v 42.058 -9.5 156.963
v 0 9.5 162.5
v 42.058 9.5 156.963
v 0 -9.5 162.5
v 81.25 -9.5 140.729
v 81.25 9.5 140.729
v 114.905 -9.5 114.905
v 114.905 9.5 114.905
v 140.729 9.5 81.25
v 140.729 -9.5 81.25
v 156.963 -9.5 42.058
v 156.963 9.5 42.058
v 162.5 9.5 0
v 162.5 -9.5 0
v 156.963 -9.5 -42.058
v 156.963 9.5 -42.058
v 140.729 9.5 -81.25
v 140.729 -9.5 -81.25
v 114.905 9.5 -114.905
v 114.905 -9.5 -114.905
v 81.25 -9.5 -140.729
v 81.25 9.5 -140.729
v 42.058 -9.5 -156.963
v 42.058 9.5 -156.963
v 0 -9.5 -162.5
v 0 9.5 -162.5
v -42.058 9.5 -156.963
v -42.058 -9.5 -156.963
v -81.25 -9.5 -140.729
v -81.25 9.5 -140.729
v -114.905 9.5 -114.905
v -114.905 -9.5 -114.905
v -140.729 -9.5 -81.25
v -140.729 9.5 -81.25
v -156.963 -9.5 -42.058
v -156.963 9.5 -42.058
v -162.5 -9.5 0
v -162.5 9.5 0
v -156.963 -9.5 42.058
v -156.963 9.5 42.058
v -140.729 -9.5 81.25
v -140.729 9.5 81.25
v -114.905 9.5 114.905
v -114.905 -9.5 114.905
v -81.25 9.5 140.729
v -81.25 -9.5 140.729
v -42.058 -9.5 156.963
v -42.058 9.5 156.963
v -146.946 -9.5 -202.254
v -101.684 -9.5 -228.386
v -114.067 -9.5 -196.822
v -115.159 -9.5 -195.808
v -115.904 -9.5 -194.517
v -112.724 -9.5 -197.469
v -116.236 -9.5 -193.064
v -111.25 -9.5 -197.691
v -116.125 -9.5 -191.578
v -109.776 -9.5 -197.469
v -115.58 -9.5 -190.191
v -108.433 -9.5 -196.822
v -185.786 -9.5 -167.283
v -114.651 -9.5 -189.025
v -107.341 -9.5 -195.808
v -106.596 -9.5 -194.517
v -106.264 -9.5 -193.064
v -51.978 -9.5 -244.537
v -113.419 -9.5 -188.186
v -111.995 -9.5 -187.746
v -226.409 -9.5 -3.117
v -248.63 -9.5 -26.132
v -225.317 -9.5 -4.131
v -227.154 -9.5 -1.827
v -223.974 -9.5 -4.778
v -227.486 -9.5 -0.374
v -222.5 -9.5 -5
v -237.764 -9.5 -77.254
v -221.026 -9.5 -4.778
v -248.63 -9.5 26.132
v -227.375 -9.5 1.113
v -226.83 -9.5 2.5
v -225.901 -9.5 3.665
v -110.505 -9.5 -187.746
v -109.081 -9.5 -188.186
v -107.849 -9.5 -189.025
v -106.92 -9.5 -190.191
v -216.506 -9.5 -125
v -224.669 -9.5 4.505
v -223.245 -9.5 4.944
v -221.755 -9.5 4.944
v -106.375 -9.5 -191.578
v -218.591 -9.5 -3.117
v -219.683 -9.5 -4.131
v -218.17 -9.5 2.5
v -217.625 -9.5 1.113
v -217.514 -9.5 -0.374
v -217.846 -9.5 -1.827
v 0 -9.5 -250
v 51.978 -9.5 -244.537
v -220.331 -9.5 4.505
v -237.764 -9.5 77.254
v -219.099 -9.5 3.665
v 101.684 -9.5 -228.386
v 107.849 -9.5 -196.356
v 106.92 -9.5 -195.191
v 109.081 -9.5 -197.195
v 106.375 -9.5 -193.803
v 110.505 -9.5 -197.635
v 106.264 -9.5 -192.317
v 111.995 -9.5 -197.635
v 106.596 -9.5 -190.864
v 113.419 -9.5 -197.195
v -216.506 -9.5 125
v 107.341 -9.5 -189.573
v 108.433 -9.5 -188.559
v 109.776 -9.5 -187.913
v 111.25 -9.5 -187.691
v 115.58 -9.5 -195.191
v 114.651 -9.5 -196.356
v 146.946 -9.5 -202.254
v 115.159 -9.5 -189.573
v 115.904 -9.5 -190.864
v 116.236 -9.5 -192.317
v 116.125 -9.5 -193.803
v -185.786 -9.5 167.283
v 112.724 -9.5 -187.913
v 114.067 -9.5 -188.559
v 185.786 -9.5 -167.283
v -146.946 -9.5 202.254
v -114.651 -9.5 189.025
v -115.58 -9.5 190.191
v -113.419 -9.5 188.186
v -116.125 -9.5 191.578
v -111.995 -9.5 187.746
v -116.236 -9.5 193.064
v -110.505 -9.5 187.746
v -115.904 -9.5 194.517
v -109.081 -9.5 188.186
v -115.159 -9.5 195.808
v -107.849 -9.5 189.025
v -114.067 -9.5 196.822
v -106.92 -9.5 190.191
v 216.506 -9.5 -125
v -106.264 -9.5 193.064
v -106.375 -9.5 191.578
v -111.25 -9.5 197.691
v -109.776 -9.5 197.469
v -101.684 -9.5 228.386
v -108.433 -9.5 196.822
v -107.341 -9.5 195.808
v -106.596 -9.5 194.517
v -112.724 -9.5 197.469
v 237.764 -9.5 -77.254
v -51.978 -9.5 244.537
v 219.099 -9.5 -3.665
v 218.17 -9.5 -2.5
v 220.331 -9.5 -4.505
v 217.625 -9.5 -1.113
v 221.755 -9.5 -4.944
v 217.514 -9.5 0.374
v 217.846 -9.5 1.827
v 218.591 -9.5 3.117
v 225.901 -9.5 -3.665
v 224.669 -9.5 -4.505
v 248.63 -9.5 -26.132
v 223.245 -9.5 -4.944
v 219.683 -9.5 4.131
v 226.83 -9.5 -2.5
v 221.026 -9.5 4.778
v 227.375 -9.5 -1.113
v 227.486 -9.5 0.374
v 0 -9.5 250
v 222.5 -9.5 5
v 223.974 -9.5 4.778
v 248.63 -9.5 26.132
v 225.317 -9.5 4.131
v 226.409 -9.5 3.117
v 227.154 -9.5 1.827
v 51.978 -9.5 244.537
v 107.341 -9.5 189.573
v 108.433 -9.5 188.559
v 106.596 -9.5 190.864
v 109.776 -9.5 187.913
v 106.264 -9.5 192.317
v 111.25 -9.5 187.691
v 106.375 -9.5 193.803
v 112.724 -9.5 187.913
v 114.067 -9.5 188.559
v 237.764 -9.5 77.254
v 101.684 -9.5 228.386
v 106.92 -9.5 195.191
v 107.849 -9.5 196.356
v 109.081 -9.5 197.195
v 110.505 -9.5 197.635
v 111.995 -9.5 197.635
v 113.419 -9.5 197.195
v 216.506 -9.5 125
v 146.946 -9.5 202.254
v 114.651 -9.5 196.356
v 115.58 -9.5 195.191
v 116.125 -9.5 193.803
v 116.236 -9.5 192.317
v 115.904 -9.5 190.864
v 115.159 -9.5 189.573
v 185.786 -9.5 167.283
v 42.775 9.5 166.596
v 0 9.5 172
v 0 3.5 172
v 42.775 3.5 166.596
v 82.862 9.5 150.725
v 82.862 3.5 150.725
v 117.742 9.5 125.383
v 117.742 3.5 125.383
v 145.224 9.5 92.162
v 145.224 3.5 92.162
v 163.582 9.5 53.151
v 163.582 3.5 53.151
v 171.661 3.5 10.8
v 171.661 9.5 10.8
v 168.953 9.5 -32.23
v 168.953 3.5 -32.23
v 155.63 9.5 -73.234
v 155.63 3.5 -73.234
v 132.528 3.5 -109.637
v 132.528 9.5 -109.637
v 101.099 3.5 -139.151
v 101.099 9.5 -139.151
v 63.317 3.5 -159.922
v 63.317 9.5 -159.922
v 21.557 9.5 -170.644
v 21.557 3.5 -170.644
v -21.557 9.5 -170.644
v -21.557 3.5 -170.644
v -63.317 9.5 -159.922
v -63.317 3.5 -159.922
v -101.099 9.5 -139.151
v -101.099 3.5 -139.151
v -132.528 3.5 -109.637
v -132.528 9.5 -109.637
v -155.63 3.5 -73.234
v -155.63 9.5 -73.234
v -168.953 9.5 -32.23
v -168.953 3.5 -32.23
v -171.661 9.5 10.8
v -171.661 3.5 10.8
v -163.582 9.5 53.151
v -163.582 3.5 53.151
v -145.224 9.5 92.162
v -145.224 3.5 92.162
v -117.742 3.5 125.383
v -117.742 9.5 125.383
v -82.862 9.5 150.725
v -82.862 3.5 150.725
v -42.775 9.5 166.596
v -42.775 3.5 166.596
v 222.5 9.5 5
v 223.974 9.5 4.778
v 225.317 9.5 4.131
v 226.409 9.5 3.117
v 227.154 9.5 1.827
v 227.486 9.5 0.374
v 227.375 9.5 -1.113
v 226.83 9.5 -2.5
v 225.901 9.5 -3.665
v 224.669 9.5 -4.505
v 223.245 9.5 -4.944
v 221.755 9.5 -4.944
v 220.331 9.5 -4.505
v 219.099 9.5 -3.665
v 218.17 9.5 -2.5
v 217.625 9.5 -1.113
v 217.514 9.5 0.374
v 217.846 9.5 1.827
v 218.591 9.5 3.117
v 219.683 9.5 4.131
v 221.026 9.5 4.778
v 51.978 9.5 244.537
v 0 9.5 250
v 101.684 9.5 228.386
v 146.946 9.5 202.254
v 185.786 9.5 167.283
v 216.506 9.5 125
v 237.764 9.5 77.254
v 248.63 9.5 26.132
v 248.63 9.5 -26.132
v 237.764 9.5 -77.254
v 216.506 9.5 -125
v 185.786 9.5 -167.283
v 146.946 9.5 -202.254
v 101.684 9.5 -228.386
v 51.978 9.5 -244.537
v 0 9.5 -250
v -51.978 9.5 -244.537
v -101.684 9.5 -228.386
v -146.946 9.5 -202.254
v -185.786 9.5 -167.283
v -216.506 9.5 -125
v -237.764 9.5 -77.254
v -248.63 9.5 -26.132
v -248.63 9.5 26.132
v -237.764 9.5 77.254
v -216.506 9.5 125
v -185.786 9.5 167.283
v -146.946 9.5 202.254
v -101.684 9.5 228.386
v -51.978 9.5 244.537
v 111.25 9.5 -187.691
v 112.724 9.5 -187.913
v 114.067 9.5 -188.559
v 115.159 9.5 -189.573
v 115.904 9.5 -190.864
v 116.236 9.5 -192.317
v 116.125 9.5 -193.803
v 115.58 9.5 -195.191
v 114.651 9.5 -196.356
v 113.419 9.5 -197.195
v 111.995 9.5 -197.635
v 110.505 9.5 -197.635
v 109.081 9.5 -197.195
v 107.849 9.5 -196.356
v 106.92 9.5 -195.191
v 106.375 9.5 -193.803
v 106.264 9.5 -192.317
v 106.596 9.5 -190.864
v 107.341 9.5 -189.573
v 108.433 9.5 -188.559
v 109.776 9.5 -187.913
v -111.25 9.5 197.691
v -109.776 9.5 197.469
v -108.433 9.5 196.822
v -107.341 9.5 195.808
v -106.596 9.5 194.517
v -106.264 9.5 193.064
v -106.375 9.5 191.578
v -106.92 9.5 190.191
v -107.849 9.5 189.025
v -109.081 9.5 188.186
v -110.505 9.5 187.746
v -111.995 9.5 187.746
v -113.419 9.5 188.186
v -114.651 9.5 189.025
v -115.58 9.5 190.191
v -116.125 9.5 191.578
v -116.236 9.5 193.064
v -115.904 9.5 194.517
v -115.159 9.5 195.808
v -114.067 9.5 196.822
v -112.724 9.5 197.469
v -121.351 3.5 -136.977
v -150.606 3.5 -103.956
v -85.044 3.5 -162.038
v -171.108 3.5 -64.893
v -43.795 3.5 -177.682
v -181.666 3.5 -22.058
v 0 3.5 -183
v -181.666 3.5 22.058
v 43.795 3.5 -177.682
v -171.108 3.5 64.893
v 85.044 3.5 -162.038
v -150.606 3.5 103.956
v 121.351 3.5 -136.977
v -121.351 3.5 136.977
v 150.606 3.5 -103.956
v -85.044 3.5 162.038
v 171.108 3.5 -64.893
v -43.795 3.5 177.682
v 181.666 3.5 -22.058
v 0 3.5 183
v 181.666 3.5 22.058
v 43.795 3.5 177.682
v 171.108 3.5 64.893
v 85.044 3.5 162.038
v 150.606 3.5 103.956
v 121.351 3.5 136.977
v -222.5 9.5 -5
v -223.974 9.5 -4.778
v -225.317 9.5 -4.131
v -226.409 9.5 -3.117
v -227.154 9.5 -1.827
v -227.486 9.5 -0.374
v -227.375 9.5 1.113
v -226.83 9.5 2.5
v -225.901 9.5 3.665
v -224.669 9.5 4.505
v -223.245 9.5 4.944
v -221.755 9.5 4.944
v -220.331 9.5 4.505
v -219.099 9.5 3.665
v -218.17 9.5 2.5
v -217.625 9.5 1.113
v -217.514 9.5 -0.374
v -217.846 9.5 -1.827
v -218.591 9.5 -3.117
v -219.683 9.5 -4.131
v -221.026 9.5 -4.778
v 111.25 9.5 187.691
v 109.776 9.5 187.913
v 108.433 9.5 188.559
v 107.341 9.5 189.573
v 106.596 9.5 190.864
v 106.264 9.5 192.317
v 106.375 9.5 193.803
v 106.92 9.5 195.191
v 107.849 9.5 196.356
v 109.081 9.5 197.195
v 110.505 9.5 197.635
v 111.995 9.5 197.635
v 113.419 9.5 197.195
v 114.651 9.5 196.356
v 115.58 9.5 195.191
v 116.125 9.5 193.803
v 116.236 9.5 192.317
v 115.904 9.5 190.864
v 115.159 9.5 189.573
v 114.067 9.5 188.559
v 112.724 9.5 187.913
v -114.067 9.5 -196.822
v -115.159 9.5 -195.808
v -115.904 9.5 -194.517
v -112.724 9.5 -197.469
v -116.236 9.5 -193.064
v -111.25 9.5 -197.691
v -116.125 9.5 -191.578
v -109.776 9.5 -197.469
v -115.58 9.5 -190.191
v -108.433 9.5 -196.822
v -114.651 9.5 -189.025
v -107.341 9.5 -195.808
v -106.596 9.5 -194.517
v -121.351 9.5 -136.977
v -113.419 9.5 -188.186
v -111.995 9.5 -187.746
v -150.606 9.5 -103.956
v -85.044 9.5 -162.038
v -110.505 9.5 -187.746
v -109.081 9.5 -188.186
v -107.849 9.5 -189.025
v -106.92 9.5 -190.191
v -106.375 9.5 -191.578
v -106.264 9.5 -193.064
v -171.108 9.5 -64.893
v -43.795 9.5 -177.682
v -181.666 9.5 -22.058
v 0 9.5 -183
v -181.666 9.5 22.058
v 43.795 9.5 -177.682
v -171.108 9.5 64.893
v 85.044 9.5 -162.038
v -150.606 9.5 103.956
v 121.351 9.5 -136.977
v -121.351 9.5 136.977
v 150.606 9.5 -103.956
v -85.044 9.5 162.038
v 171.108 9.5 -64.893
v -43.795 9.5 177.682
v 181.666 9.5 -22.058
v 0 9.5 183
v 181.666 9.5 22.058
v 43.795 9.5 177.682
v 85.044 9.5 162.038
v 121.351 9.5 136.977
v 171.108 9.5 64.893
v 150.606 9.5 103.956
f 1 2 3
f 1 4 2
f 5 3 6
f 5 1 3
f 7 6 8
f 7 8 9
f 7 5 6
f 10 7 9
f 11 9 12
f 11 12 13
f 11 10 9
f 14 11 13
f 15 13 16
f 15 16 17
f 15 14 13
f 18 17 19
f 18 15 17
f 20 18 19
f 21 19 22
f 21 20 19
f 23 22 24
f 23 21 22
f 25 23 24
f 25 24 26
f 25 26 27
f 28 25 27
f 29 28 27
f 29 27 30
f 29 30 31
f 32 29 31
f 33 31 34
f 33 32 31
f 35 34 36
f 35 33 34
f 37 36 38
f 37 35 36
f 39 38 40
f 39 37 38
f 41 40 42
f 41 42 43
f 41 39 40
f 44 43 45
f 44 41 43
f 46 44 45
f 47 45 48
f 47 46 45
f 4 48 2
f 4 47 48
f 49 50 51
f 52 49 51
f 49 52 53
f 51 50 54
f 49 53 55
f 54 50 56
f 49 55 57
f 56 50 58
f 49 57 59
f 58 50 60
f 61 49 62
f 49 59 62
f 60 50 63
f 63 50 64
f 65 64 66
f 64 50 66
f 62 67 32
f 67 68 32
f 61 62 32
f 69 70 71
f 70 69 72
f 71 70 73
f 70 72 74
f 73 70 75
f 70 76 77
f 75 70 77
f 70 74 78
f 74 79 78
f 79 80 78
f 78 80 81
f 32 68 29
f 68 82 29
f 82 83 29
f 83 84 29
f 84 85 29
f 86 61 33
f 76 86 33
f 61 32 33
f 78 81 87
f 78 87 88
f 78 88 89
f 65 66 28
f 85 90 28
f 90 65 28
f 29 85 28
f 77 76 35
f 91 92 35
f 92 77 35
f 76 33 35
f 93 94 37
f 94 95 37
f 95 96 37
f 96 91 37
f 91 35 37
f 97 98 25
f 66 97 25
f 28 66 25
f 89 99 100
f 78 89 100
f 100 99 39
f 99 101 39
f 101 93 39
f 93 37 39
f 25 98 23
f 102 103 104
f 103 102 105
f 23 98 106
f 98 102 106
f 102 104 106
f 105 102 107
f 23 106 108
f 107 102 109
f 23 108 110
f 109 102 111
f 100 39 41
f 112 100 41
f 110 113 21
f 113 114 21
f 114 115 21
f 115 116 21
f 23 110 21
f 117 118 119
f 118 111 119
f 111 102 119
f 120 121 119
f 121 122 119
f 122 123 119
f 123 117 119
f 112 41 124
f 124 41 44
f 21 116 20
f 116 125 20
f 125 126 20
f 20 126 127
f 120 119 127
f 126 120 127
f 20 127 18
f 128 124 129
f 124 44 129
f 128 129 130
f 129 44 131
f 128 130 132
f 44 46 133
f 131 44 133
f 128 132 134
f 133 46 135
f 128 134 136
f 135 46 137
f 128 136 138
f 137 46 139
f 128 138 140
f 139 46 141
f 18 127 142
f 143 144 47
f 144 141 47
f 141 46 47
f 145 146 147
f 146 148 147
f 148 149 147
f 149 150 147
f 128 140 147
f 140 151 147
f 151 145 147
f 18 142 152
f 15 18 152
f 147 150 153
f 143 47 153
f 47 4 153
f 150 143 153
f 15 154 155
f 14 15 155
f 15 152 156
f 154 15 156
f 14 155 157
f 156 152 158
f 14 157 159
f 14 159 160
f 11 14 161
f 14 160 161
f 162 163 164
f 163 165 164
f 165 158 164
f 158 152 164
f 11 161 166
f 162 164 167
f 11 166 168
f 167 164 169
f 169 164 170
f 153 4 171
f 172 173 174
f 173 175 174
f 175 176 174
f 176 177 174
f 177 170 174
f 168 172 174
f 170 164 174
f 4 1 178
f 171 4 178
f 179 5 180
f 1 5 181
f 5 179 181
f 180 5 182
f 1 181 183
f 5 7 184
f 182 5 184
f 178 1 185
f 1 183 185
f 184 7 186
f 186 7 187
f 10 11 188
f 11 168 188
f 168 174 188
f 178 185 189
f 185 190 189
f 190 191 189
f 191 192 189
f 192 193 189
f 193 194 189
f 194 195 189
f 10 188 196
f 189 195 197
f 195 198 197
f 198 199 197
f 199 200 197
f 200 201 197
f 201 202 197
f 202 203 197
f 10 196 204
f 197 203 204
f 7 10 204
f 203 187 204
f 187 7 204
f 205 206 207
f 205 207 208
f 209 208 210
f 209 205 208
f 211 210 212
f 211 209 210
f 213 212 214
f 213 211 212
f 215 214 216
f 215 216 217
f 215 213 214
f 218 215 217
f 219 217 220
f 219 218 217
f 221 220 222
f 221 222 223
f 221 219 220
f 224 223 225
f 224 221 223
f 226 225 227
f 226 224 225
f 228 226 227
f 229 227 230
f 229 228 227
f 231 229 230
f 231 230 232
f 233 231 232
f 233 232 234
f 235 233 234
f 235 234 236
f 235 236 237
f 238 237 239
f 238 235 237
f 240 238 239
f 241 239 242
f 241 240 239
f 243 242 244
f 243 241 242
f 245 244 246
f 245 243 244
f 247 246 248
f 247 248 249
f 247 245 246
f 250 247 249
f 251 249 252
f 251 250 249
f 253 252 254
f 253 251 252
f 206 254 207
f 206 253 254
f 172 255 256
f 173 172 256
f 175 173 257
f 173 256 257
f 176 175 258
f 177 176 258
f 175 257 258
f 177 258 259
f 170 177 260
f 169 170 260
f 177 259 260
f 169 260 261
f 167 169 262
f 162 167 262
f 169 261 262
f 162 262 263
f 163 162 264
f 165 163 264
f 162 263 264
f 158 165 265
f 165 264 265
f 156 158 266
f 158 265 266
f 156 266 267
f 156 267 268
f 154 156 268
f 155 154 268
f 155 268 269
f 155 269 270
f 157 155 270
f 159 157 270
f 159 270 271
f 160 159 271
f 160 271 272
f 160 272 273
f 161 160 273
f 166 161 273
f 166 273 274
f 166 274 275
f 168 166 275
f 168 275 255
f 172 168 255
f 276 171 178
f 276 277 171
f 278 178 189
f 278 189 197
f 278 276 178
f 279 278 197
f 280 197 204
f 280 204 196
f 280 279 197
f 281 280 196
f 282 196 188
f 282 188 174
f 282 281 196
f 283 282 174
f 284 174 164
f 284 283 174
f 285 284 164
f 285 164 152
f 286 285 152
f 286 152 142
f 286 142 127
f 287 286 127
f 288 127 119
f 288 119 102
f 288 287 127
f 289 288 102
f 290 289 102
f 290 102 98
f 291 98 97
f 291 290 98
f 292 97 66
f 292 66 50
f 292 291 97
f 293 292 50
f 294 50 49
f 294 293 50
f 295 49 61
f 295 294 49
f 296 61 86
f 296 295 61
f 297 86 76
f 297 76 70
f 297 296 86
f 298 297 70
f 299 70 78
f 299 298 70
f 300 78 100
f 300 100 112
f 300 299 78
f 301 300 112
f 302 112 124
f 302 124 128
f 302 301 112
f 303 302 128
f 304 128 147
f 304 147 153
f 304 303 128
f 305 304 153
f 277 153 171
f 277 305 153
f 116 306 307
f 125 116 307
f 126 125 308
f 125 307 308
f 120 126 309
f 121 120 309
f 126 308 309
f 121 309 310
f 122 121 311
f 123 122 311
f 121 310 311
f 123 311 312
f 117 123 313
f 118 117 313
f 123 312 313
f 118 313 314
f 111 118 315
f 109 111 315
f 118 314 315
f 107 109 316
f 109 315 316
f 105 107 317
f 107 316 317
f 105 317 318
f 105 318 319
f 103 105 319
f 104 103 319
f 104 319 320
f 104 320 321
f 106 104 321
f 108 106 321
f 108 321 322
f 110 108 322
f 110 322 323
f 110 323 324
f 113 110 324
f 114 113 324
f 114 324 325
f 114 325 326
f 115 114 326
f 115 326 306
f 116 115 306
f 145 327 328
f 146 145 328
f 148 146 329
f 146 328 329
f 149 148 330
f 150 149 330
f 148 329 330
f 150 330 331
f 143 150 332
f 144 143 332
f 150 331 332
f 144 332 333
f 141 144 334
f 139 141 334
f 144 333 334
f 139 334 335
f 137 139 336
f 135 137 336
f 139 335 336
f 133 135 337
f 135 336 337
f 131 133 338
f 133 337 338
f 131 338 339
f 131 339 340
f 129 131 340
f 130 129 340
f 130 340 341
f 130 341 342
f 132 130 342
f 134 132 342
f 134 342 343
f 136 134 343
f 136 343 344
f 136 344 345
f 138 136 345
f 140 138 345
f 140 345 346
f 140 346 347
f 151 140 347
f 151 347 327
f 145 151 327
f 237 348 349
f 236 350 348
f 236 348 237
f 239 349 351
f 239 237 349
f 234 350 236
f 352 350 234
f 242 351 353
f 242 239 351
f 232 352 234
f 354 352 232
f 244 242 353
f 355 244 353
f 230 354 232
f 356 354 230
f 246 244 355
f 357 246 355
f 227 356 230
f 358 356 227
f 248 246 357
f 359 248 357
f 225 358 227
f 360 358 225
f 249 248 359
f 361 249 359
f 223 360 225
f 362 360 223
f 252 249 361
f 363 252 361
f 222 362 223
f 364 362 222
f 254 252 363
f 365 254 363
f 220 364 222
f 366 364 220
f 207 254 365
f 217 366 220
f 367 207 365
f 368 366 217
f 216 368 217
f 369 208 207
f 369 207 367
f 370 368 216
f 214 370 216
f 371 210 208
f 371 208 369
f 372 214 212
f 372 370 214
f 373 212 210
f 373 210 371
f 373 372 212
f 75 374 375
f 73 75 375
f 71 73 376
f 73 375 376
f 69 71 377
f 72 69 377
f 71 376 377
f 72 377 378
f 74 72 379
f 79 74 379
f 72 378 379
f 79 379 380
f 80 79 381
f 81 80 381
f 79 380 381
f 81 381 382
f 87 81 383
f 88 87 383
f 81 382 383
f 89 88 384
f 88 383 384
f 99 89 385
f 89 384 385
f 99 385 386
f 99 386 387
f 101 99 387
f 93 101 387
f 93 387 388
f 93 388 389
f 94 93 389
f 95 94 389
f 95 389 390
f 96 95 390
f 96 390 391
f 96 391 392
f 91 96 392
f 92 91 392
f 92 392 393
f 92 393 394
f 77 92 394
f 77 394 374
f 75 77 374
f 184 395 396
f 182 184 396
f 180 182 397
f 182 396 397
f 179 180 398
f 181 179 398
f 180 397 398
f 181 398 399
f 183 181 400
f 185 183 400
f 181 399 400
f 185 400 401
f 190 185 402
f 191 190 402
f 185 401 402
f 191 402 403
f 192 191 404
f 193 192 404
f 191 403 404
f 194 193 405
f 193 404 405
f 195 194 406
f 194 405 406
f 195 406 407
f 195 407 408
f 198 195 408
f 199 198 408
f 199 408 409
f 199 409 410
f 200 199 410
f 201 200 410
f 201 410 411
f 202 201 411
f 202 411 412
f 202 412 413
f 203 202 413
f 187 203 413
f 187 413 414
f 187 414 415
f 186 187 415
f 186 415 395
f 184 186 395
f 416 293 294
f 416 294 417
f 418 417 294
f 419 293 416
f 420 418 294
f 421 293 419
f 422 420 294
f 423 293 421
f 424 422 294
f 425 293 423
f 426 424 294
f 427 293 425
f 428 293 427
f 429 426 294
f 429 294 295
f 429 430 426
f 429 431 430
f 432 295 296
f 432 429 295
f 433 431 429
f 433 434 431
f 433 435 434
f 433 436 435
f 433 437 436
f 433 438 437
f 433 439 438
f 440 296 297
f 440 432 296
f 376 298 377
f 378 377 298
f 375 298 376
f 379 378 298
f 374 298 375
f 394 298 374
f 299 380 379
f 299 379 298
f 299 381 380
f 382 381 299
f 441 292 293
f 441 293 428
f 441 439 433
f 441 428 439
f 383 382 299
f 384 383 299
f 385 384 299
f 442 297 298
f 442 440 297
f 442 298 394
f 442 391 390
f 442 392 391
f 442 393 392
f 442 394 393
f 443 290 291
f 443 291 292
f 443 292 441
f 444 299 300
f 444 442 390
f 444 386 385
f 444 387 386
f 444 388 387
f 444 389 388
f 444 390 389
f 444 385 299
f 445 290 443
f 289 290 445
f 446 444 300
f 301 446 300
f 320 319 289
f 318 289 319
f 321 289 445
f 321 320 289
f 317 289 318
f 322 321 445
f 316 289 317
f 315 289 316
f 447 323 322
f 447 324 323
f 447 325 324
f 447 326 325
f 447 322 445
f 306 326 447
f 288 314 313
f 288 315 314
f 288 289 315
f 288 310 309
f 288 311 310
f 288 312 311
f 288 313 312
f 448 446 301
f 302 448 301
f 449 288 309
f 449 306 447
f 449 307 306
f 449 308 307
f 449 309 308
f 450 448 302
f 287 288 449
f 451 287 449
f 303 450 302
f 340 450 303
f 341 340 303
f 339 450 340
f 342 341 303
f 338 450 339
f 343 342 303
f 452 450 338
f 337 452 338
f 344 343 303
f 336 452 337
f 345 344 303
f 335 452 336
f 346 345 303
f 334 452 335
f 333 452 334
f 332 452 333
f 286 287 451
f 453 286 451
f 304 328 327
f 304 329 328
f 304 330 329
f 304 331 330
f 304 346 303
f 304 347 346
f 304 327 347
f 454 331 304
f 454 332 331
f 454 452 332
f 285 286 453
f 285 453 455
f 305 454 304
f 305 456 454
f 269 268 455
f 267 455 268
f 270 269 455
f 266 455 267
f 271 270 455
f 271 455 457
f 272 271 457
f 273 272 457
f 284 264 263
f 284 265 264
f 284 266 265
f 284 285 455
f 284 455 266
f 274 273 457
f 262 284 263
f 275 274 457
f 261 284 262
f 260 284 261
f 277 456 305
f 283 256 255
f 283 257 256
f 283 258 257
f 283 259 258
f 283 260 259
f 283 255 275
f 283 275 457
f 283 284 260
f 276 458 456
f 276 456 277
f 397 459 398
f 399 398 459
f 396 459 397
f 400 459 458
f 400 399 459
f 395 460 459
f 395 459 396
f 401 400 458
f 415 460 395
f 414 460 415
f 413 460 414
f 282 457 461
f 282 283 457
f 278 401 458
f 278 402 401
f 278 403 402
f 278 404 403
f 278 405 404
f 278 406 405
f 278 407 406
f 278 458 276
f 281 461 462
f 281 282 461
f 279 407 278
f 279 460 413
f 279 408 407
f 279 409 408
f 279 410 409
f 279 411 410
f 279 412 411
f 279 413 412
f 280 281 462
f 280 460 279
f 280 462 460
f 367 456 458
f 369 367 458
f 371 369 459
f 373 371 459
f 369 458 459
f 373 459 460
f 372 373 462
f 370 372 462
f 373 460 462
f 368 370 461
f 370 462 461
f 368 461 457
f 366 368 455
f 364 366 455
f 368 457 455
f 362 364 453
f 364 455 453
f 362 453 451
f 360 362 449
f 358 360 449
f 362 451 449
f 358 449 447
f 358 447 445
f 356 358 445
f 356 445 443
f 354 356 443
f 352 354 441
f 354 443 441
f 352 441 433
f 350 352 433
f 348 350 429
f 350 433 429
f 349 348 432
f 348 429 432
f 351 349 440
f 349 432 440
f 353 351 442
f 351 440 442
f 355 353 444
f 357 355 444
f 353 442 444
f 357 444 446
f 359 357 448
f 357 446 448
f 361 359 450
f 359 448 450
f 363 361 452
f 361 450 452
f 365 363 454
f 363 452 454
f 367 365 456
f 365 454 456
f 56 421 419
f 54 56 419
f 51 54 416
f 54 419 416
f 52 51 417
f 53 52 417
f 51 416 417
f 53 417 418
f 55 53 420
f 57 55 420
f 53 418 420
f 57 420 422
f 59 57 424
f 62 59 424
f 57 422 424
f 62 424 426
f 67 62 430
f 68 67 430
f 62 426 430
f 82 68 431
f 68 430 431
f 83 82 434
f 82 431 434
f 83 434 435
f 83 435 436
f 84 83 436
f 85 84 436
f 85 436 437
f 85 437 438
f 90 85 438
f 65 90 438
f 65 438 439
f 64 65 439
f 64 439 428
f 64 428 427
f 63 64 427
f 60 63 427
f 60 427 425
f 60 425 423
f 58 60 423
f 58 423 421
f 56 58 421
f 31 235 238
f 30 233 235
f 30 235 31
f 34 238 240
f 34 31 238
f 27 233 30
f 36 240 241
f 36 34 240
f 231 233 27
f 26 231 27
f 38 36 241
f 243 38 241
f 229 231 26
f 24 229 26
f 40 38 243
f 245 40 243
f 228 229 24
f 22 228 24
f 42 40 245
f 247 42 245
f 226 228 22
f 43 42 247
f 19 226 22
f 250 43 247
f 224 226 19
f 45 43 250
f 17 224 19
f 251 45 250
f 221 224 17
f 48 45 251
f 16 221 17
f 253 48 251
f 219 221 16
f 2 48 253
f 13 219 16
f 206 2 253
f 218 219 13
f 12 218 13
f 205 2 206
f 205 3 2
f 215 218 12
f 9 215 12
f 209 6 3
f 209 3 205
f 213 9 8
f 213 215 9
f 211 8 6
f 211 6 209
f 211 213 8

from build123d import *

# Parameters (mm, degrees)
SKETCH1_R           = 250
SKETCH1_R_2         = 162.5
BOSS_EXTRUDE1_DEPTH = 9.5
SKETCH2_R           = 5
CUT_EXTRUDE1_DEPTH  = 355.063553617
SKETCH3_R           = 183
SKETCH3_R_2         = 172
CUT_EXTRUDE2_DEPTH  = 6


with BuildPart() as part:
    # Sketch1 → Boss-Extrude1 (new, symmetric)
    with BuildSketch(Plane(origin=(0, 0, 0), x_dir=(1, 0, 0), z_dir=(0, 1, 0))):
        with Locations(Location((0, 0, 0), (0, 0, 270))):
            Circle(SKETCH1_R)
        with Locations(Location((0, 0, 0), (0, 0, 270))):
            Circle(SKETCH1_R_2, mode=Mode.SUBTRACT)
    extrude(amount=BOSS_EXTRUDE1_DEPTH, both=True)

    # Sketch2 → Cut-Extrude1 (cut, through all)
    with BuildSketch(Plane(origin=(0, 9.5, 0), x_dir=(1, 0, 0), z_dir=(0, 1, 0))):
        with Locations(Location((111.25, 192.690652342, 0), (0, 0, 270))):
            Circle(SKETCH2_R)
        with Locations(Location((222.5, 0, 0), (0, 0, 270))):
            Circle(SKETCH2_R)
        with Locations(Location((-222.5, 0, 0), (0, 0, 90))):
            Circle(SKETCH2_R)
        with Locations(Location((-111.25, 192.690652342, 0), (0, 0, 90))):
            Circle(SKETCH2_R)
        with Locations(Location((111.25, -192.690652342, 0), (0, 0, 90))):
            Circle(SKETCH2_R)
        with Locations(Location((-111.25, -192.690652342, 0), (0, 0, 270))):
            Circle(SKETCH2_R)
    extrude(amount=-CUT_EXTRUDE1_DEPTH, mode=Mode.SUBTRACT)

    # Sketch3 → Cut-Extrude2 (cut)
    with BuildSketch(Plane(origin=(0, 9.5, 0), x_dir=(1, 0, 0), z_dir=(0, 1, 0))):
        with Locations(Location((0, 0, 0), (0, 0, 270))):
            Circle(SKETCH3_R)
        with Locations(Location((0, 0, 0), (0, 0, 270))):
            Circle(SKETCH3_R_2, mode=Mode.SUBTRACT)
    extrude(amount=-CUT_EXTRUDE2_DEPTH, mode=Mode.SUBTRACT)


solid = part.part
